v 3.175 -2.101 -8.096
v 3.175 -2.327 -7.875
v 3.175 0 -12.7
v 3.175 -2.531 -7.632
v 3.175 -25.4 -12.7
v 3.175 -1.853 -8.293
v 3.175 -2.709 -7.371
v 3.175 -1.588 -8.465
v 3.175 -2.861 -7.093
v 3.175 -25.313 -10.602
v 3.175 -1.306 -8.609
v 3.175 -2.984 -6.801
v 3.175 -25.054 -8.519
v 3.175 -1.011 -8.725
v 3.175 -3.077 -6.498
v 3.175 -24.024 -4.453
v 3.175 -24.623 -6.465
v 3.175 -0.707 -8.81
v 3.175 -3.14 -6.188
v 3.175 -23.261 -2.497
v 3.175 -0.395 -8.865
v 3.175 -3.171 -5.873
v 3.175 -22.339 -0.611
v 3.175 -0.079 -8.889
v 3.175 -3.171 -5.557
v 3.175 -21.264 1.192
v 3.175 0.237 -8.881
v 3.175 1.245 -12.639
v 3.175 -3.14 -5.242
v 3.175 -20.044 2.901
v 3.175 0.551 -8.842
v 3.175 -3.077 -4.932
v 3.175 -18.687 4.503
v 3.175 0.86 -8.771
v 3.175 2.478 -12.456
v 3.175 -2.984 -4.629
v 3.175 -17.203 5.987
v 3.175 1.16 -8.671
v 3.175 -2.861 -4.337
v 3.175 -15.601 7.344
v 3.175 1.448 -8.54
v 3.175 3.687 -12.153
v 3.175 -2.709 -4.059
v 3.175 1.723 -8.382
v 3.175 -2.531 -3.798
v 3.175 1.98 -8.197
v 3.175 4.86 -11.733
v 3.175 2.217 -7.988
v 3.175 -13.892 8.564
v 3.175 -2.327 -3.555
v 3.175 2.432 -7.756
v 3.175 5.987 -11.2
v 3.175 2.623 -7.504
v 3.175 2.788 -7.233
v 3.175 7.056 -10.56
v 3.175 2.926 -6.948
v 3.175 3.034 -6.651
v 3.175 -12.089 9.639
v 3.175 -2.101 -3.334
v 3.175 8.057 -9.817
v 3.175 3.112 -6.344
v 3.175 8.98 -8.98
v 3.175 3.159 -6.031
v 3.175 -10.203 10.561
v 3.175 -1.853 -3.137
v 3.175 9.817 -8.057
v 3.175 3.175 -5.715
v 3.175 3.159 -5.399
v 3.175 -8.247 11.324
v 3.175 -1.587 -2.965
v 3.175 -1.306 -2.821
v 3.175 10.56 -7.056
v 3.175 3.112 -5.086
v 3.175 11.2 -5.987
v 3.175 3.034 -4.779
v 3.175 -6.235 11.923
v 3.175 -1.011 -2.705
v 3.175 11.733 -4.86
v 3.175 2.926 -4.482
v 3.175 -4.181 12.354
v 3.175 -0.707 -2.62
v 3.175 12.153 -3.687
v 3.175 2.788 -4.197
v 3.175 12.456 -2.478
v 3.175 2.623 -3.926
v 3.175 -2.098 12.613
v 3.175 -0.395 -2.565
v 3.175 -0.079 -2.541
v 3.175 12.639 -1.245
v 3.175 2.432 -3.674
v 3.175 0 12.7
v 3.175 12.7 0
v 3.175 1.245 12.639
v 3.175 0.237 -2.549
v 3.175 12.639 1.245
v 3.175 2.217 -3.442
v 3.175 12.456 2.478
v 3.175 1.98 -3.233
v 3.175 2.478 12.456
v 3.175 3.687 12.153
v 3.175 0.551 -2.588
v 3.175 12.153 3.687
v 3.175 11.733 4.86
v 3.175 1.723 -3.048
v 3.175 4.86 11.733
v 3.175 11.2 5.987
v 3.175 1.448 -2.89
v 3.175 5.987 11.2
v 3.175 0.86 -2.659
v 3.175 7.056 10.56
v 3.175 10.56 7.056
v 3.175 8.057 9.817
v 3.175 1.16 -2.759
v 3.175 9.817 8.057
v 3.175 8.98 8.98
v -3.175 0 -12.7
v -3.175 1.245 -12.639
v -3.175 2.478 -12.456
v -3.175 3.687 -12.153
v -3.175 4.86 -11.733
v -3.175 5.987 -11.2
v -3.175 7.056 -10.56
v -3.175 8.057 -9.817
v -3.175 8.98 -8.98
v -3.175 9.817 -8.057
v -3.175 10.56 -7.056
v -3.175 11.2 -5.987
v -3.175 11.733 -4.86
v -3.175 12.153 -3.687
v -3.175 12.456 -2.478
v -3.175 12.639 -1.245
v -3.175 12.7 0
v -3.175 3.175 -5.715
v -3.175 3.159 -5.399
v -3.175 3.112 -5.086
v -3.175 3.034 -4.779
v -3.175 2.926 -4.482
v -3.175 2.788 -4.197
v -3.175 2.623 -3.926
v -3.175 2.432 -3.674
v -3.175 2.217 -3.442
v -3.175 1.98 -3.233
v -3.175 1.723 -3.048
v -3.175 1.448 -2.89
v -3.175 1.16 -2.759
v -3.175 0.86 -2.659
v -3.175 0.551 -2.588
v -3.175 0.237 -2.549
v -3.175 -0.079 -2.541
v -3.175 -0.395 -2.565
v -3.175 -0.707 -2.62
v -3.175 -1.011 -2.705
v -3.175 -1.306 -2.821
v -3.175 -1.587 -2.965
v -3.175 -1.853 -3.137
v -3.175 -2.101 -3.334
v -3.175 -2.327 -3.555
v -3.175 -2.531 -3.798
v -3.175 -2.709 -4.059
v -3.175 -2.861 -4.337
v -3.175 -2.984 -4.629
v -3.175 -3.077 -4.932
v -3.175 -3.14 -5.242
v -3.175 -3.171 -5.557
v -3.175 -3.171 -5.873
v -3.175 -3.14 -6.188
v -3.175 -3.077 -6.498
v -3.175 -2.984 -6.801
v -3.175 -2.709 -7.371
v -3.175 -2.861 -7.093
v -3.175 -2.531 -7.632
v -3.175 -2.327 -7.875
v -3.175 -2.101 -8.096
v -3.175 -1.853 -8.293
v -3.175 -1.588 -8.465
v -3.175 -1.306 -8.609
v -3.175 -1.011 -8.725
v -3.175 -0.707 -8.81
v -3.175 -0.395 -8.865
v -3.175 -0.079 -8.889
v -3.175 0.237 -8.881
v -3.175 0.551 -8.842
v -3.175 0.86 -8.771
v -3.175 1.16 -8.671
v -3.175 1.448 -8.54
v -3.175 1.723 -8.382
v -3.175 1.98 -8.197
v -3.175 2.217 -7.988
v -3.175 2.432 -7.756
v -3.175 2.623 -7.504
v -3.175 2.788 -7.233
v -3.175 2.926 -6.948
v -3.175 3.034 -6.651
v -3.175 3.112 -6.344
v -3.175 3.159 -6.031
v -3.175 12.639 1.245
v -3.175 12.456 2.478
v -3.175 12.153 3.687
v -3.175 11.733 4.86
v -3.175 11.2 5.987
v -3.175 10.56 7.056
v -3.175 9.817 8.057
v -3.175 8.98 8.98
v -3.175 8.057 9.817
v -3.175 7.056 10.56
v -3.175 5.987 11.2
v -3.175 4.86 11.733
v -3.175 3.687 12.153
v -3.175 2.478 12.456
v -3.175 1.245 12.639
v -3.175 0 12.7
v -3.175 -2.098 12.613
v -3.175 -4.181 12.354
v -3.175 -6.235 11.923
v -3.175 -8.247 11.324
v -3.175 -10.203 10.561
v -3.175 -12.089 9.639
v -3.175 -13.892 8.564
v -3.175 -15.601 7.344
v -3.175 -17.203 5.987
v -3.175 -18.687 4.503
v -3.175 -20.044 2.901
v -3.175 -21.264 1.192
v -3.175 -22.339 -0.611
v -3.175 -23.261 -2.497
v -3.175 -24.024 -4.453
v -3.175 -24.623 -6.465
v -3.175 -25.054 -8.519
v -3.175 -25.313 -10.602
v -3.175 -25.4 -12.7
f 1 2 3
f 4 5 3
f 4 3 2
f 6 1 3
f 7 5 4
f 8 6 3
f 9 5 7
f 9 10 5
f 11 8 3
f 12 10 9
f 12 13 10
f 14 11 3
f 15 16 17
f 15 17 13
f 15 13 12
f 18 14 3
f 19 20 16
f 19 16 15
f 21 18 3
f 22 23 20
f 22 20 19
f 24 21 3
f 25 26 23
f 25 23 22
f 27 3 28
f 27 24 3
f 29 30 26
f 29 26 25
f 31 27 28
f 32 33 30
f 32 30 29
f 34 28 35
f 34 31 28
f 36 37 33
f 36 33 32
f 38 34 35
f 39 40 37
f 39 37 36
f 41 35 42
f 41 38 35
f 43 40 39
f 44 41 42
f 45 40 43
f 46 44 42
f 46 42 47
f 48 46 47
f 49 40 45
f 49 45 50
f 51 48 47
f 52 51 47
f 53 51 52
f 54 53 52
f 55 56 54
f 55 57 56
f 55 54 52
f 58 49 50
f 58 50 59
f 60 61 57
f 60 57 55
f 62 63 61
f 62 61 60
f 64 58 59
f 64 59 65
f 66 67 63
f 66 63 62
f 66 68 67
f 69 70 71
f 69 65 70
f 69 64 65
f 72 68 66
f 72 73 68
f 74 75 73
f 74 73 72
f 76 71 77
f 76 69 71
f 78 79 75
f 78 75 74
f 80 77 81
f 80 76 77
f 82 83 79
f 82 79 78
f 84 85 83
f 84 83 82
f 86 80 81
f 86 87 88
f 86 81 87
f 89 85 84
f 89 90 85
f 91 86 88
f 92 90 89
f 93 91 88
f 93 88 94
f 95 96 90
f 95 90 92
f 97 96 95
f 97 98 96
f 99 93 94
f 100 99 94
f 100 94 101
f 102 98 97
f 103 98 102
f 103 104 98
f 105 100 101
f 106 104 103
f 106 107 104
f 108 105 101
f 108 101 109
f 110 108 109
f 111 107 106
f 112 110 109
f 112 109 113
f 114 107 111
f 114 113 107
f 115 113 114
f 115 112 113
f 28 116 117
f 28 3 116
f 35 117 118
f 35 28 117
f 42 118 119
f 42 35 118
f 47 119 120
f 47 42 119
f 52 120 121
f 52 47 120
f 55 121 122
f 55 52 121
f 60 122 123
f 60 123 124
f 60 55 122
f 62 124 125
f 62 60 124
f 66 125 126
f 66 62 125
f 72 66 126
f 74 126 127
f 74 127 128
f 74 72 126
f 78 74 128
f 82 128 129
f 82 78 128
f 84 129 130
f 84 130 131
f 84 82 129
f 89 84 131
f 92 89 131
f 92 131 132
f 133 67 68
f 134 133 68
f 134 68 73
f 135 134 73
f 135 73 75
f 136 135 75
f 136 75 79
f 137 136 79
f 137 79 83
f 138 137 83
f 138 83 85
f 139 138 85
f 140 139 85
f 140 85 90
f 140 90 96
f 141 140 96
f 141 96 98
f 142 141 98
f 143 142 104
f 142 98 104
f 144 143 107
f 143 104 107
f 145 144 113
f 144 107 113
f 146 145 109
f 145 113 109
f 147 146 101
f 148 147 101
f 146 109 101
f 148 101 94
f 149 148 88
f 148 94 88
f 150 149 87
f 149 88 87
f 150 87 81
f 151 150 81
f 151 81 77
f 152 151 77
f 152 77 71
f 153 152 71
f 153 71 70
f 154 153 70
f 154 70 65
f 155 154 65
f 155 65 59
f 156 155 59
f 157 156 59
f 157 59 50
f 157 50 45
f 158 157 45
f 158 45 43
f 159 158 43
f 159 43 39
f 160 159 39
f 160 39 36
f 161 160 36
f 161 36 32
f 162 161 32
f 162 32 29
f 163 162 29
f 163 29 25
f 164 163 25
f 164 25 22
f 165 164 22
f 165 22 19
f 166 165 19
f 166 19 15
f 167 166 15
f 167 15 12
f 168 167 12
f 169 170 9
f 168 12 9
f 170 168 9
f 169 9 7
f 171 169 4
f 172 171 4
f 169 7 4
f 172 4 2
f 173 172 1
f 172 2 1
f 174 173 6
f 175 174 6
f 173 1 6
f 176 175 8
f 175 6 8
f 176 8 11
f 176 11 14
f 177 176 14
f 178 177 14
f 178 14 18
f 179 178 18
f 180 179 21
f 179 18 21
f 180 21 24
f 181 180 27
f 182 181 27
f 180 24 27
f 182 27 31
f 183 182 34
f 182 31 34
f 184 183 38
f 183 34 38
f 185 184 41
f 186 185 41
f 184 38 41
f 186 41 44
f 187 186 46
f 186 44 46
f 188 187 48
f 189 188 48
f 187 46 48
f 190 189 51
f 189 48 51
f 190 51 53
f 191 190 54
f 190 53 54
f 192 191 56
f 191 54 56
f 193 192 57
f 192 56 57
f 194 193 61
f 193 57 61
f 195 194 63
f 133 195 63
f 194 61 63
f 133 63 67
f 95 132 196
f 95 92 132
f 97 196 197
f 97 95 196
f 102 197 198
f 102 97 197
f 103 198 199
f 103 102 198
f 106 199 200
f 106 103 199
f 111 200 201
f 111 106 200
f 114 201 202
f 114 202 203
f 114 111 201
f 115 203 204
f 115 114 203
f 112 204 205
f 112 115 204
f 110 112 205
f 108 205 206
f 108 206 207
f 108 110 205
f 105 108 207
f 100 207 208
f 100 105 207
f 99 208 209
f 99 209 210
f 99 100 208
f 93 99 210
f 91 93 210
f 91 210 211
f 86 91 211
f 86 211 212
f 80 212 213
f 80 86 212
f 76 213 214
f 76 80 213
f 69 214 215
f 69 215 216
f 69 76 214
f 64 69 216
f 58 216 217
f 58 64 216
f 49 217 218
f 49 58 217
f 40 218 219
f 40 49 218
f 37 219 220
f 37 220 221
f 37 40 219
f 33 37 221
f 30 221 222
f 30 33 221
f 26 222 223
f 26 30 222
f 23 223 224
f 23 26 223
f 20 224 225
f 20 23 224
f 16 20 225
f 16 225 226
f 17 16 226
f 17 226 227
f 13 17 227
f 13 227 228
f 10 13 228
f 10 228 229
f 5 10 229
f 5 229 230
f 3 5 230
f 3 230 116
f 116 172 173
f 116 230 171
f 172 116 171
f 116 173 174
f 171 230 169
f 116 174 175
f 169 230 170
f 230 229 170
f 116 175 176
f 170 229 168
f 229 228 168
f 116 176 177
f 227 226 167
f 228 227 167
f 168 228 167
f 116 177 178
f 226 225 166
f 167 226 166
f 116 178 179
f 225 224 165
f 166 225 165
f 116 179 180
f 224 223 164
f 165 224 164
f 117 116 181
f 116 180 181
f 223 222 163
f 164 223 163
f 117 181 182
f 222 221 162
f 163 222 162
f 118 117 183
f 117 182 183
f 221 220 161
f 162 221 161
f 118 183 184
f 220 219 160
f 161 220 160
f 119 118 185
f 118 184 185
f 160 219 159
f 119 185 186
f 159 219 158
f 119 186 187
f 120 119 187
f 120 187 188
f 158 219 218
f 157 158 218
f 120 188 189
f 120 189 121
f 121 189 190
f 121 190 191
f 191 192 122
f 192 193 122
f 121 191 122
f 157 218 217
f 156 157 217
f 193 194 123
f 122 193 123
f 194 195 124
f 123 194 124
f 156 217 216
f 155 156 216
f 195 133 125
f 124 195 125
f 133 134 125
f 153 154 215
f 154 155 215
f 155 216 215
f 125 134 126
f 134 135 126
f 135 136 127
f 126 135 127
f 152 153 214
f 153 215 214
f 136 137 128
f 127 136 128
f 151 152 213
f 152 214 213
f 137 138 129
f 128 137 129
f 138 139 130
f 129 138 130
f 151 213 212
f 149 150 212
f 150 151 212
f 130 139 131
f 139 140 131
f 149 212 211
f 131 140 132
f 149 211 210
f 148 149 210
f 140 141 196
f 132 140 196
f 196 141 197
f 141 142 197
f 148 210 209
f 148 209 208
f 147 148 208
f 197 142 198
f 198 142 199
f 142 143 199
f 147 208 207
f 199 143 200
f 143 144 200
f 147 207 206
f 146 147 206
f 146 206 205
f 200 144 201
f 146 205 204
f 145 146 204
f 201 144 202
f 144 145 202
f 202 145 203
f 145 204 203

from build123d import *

# Parameters (mm, degrees)
F1_DEPTH = 3.175
F2_R     = 3.175
F3_DEPTH = 6.351


with BuildPart() as f1:
    # F0 (on Right) → F1 (new body, symmetric)
    with BuildSketch(Plane.YZ):
        with BuildLine():
            Line((0, -12.7), (0, 0))
            Line((0, 0), (0, 12.7))
            ThreePointArc((0, 12.7), (-17.960512, 5.260512), (-25.4, -12.7))
            Line((-25.4, -12.7), (0, -12.7))
        make_face()
        with BuildLine():
            Line((0, 12.7), (0, 0))
            Line((0, 0), (12.7, 0))
            ThreePointArc((12.7, 0), (8.980256, 8.980256), (0, 12.7))
        make_face()
        with BuildLine():
            Line((12.7, 0), (0, 0))
            Line((0, 0), (0, -12.7))
            ThreePointArc((0, -12.7), (8.980256, -8.980256), (12.7, 0))
        make_face()
    extrude(amount=F1_DEPTH, both=True)

    # F2 (on face) → F3 (cut, through all)
    with BuildSketch(Plane.YZ.offset(3.175)):
        with Locations((0, -5.715)):
            Circle(F2_R)
    extrude(amount=-F3_DEPTH, mode=Mode.SUBTRACT)


solid = f1.part
